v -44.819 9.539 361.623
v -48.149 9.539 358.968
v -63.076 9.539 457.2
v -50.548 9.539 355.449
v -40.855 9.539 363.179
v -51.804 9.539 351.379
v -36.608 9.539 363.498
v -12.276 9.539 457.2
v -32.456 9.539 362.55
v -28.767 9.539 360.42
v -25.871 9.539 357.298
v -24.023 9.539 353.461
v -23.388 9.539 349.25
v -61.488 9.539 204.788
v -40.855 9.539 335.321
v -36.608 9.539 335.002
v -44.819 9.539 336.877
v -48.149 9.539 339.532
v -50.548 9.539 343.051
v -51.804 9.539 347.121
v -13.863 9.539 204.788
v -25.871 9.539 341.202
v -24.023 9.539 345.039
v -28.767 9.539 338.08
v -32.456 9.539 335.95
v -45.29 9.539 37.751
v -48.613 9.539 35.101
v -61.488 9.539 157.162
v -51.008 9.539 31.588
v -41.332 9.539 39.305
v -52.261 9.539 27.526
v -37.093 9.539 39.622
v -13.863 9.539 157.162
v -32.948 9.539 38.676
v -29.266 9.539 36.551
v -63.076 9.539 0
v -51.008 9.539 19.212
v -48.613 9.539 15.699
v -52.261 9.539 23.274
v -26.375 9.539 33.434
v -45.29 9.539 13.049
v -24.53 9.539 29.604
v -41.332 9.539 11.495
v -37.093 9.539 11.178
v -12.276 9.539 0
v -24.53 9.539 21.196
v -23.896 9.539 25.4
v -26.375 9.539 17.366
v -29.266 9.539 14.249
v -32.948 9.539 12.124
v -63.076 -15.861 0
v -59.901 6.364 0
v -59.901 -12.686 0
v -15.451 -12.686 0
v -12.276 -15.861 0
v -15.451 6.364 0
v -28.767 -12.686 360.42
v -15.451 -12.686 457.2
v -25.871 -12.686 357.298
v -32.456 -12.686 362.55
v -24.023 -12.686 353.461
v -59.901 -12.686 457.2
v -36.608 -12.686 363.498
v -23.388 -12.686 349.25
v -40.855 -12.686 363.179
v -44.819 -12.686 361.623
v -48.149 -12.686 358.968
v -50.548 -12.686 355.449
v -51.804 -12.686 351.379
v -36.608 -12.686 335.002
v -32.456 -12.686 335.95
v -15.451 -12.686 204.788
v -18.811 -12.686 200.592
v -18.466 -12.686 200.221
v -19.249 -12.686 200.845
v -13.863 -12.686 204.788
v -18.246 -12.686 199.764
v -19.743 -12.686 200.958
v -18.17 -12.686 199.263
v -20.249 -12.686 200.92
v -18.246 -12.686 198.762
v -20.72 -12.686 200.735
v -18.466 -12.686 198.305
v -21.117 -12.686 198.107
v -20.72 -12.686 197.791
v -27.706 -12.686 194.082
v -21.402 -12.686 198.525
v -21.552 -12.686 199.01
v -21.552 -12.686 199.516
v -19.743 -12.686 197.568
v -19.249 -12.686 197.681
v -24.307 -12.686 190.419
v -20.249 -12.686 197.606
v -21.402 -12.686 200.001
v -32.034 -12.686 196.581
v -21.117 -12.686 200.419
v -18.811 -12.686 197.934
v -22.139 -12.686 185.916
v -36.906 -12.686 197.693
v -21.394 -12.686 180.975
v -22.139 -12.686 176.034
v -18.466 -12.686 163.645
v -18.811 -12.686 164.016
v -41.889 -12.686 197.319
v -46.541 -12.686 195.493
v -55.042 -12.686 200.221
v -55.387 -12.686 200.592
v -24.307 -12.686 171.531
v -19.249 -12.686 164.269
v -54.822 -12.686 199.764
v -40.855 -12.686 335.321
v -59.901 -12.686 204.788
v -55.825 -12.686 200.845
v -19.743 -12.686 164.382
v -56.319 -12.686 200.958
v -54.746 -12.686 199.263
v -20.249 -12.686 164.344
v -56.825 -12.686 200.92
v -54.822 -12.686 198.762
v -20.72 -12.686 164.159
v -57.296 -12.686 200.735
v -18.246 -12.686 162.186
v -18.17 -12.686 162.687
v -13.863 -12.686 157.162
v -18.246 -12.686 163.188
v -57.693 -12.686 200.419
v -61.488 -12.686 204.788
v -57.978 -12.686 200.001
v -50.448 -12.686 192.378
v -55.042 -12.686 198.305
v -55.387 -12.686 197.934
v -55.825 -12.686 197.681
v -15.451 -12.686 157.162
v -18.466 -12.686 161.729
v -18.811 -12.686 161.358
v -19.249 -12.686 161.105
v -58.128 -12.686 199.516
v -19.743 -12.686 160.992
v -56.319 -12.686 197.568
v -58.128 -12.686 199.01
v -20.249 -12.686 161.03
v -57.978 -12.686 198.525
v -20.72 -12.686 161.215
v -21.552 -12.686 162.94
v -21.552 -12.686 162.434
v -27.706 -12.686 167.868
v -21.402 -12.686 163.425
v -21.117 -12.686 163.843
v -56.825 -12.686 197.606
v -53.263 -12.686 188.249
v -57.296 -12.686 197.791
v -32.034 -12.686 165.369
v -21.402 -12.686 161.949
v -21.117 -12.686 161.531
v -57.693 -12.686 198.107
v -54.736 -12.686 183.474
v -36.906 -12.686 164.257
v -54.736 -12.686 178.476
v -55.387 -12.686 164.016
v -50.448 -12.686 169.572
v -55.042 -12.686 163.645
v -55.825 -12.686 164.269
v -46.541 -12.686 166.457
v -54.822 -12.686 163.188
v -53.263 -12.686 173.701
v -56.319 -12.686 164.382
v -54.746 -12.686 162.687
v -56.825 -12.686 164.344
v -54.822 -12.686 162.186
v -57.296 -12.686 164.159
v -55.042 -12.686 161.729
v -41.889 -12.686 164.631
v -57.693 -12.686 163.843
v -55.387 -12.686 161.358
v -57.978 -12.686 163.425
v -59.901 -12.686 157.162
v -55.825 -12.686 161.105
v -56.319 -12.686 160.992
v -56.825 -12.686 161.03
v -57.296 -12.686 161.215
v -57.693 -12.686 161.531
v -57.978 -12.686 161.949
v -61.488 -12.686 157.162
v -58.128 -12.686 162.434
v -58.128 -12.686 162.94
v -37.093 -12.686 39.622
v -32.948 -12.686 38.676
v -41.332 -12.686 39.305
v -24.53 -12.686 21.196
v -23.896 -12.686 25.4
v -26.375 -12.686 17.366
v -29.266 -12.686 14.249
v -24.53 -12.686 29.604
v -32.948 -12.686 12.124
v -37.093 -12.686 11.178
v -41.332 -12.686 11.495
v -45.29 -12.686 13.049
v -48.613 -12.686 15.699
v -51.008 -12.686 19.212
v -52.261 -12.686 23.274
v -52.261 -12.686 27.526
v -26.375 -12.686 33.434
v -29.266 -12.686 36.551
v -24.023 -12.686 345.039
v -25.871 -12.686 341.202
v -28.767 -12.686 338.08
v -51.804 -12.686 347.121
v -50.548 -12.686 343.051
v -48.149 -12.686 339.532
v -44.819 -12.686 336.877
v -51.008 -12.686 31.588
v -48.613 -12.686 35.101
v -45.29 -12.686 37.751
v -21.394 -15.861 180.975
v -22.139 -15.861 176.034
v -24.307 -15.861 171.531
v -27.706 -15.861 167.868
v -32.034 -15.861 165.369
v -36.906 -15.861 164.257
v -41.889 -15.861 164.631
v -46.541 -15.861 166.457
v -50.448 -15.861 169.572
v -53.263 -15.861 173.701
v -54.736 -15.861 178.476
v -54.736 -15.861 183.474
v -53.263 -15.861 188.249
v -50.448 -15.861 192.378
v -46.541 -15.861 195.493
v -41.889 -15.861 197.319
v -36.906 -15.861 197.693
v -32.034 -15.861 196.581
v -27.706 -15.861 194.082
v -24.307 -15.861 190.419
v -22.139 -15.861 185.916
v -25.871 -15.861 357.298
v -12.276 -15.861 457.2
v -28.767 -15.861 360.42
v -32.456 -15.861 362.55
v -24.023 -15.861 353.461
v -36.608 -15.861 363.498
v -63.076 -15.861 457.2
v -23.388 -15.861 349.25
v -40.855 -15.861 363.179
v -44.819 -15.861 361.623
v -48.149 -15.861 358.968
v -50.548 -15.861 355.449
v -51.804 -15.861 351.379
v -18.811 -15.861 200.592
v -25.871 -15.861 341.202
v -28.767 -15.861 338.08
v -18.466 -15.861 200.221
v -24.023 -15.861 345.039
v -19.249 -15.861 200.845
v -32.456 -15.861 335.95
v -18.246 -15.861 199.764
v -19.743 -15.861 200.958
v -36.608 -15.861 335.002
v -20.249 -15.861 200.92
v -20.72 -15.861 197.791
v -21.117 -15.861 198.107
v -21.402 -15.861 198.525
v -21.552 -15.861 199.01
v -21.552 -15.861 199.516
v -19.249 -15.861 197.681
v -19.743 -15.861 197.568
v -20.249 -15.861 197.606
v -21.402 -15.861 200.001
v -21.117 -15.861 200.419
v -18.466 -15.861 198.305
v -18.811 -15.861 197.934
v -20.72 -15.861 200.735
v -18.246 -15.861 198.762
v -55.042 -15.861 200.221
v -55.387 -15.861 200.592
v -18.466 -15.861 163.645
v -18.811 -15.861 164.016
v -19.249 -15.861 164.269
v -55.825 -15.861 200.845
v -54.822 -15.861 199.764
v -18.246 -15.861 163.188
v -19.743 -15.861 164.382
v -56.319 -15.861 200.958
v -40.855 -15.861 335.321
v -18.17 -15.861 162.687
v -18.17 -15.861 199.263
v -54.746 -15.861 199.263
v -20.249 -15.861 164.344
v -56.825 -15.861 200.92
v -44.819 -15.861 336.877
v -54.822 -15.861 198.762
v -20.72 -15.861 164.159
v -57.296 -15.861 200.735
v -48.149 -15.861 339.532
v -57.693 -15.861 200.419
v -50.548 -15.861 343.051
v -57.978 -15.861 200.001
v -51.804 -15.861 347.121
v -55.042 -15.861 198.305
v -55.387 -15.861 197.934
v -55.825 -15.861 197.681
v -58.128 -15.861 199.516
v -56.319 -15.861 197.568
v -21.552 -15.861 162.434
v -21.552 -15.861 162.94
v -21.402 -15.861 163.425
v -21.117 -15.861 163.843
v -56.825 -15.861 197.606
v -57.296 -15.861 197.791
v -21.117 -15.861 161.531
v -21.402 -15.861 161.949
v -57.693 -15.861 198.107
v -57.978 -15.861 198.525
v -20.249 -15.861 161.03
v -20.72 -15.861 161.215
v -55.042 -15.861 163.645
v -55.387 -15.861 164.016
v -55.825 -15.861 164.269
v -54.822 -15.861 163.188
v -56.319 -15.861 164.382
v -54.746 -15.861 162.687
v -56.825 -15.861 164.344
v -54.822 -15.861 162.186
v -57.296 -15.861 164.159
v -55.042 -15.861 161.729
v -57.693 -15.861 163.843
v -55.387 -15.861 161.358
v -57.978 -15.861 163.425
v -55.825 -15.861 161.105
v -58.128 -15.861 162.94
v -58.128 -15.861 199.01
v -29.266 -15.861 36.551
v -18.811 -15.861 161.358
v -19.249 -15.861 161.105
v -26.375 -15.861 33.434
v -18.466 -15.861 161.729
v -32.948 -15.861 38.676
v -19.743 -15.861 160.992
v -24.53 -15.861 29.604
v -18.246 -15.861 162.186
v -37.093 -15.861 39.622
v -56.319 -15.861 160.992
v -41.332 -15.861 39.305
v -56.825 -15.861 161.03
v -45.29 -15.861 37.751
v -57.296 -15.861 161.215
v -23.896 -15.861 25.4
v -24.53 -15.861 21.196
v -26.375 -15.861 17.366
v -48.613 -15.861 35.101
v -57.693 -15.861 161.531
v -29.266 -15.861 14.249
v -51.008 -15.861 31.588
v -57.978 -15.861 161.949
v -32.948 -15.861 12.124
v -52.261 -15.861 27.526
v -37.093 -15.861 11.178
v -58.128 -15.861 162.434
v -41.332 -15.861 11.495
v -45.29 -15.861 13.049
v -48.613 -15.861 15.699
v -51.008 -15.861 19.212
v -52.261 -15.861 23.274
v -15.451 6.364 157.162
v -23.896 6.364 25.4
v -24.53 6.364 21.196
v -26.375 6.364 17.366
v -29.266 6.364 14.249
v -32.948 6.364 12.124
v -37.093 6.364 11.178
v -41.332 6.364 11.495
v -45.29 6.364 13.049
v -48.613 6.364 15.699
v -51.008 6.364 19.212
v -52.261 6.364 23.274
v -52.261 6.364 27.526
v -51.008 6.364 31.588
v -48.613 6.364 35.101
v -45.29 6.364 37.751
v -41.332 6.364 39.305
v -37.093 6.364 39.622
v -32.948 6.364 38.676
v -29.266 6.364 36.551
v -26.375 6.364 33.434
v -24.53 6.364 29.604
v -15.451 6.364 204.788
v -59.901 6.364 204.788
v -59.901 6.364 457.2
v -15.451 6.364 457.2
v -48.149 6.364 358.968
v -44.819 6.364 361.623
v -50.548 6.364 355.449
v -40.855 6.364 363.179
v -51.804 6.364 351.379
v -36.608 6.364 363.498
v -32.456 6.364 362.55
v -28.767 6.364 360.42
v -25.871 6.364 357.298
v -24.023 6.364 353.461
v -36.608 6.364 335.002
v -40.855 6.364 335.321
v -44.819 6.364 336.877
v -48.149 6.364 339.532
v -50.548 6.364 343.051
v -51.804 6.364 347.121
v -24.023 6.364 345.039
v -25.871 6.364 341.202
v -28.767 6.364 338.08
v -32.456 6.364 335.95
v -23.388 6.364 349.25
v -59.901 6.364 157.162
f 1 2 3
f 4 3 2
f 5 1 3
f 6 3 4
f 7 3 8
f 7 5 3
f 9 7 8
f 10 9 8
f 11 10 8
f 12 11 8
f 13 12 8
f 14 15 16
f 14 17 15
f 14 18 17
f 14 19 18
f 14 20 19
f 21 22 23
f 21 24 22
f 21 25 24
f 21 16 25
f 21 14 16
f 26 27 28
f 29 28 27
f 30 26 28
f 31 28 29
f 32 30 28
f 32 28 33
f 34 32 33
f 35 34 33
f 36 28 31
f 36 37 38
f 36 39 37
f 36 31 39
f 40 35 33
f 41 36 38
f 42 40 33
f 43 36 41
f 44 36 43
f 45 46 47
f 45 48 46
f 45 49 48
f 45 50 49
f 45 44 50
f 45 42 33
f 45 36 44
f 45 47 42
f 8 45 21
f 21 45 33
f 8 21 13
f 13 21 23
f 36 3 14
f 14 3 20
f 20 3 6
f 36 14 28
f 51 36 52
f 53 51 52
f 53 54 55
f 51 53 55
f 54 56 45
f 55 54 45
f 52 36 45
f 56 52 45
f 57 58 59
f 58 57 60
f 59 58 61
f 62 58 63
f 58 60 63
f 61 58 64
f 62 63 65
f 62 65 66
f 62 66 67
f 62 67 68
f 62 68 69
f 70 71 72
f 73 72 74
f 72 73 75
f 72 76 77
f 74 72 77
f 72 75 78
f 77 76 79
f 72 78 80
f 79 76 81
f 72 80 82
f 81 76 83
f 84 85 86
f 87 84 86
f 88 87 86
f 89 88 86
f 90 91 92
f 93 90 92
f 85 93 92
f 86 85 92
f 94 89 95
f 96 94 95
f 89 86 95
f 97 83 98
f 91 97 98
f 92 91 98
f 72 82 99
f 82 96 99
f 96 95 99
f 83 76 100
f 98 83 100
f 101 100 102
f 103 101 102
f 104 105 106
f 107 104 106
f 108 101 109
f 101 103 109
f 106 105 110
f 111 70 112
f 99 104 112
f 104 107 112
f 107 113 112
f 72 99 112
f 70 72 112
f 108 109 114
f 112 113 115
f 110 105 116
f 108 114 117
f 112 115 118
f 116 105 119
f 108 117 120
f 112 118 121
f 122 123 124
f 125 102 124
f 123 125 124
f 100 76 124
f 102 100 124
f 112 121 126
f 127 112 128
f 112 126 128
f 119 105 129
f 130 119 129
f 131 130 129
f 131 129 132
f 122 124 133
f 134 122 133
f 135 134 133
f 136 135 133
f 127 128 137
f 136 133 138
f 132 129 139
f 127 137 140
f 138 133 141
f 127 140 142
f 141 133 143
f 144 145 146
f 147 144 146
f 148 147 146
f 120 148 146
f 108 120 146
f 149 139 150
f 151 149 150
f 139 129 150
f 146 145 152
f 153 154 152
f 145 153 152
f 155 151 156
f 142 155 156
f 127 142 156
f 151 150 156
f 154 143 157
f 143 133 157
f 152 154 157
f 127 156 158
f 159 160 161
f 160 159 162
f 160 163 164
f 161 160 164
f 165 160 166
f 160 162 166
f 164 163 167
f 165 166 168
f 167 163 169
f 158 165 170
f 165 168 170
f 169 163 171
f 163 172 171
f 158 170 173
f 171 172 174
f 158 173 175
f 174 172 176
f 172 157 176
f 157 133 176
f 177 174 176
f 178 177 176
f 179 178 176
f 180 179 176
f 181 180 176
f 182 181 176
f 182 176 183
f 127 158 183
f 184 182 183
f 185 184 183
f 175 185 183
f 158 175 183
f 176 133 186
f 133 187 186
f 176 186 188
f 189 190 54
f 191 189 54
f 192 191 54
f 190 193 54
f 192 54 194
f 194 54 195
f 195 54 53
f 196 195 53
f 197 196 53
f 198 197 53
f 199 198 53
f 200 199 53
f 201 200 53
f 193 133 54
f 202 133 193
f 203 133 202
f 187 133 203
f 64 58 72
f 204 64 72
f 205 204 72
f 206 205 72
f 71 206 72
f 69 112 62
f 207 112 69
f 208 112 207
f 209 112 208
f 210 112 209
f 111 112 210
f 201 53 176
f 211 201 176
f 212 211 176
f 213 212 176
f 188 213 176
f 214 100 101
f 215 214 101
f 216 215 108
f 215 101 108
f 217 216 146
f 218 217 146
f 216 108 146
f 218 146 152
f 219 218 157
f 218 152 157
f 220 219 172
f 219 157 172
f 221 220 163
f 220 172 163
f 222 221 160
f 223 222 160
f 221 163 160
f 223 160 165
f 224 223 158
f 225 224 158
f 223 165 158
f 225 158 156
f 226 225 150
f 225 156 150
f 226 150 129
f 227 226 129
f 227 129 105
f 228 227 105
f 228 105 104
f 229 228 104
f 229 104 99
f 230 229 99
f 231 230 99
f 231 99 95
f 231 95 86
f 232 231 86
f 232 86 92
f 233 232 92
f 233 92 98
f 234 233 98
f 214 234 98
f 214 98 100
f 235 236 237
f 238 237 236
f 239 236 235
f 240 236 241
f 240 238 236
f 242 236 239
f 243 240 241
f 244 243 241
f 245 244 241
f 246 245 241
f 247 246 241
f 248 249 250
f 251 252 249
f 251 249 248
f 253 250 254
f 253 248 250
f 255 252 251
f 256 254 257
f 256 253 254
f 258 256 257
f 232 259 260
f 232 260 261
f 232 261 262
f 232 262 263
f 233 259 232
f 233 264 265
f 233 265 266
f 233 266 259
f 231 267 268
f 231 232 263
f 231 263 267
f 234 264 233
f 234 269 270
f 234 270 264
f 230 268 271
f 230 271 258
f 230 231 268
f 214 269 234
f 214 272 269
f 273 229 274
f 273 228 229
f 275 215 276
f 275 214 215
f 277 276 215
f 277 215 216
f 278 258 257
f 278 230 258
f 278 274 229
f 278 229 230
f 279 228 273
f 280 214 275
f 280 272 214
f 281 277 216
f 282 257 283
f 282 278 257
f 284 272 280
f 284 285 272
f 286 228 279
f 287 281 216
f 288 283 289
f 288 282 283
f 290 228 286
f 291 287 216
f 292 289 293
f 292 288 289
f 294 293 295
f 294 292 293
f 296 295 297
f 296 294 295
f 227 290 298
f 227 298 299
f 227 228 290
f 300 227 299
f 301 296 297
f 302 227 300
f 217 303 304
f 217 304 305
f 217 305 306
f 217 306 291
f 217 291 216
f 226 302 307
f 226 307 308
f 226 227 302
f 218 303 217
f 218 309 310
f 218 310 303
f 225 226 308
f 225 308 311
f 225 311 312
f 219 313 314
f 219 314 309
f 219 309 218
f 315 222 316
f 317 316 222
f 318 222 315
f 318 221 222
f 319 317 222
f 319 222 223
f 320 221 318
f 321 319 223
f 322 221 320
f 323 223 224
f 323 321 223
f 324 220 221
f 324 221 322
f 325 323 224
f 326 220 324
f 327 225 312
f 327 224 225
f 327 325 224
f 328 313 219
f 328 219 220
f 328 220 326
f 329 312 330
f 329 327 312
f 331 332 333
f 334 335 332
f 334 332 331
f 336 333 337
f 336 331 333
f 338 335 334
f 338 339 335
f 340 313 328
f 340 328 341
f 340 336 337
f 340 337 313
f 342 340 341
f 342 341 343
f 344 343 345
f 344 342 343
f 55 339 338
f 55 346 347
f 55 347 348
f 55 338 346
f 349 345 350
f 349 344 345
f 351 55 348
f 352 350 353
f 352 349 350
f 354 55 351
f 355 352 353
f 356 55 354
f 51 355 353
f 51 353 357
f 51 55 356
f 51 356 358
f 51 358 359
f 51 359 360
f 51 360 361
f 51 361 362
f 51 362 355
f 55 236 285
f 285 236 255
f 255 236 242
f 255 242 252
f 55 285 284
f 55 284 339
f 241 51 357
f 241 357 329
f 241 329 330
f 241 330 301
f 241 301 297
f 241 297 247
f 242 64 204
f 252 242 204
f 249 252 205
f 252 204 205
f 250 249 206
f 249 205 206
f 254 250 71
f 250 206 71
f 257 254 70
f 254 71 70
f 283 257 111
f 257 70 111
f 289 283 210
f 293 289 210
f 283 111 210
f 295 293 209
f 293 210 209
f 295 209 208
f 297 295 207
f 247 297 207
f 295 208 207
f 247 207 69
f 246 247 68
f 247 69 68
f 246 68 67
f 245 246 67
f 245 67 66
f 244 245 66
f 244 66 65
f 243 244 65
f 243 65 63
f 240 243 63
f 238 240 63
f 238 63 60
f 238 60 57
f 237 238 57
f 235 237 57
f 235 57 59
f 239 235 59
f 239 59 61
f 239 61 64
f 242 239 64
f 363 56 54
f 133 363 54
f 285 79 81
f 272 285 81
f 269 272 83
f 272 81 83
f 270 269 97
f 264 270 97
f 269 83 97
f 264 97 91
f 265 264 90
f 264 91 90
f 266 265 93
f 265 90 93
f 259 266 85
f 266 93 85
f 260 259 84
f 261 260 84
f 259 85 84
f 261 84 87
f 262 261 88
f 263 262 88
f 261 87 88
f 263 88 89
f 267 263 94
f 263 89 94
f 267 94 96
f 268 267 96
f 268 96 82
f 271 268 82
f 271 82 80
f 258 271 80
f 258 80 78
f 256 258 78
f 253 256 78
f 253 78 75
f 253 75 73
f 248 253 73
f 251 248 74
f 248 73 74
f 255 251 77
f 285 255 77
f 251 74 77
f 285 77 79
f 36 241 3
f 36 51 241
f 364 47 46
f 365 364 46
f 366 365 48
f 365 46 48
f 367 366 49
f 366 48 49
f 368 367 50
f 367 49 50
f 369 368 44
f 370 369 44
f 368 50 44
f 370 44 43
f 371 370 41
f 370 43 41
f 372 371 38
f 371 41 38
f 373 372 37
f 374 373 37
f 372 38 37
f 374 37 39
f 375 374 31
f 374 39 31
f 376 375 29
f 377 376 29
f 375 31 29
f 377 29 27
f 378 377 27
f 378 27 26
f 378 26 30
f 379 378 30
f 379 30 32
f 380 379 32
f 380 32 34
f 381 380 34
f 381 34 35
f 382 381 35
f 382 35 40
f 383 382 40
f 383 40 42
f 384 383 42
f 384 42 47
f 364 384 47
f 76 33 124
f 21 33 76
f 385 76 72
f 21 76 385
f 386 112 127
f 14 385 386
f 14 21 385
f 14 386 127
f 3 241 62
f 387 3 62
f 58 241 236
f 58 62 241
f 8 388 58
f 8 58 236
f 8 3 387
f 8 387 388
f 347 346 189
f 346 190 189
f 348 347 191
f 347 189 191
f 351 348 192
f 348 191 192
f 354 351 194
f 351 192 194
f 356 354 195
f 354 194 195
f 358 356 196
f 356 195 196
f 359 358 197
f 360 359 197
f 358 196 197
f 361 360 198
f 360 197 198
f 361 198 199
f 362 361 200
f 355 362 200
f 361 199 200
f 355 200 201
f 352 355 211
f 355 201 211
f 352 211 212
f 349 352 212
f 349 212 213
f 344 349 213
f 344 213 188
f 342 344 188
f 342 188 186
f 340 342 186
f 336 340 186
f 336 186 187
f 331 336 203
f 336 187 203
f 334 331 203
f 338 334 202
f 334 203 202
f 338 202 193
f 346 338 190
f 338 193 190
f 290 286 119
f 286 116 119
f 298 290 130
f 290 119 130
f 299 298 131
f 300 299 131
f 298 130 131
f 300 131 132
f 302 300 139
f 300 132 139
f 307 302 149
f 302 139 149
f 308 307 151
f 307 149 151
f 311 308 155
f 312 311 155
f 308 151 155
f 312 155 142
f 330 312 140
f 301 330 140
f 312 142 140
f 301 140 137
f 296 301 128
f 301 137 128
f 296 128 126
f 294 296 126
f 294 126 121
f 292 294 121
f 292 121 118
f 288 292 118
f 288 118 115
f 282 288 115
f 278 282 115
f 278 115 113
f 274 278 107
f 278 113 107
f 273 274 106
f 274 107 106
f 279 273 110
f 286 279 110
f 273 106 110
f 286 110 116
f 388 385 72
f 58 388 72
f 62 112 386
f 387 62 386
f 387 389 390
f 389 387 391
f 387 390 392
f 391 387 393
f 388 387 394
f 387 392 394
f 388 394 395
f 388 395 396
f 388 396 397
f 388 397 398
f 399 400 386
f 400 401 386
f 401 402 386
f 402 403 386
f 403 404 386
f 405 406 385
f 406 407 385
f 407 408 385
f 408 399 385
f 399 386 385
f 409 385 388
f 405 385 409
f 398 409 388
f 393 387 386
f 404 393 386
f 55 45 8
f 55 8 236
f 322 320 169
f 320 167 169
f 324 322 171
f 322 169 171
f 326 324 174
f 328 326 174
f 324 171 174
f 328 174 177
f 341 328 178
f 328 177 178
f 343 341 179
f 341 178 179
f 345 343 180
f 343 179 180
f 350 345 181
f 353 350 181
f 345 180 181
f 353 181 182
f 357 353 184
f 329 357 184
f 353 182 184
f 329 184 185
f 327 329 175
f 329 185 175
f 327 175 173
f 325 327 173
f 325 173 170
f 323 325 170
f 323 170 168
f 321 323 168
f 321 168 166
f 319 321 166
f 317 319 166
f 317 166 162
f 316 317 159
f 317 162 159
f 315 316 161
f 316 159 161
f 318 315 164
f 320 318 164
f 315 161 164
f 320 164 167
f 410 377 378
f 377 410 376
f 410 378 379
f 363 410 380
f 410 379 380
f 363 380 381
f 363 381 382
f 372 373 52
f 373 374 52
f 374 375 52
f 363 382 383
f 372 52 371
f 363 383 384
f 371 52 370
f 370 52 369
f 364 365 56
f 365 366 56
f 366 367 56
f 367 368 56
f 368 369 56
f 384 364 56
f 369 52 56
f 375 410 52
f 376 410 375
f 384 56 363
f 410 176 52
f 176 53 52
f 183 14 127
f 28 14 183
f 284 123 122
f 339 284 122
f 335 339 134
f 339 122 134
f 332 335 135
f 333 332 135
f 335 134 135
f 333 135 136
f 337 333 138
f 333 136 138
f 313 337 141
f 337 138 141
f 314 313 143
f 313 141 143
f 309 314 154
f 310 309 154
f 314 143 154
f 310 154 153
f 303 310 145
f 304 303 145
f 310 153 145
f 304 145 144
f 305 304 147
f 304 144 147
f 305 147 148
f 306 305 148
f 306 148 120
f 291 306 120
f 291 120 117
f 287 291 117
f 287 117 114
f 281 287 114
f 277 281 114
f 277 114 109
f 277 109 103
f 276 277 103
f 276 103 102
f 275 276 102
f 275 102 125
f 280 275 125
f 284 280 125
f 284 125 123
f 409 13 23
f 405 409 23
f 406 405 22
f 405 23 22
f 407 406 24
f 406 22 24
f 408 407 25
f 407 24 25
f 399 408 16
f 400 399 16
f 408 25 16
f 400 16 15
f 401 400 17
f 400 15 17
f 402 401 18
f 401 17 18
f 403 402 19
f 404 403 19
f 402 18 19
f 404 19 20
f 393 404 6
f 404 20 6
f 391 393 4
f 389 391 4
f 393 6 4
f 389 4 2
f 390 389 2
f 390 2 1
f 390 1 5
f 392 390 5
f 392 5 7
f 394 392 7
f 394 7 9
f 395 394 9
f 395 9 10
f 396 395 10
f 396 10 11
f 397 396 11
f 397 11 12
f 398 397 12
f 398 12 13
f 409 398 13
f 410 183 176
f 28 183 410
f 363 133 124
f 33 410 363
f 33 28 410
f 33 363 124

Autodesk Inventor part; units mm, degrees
ref_plane "YZ Plane" through (0, 0, 0) normal (1, 0, 0) x (0, 1, 0)
ref_plane "XZ Plane" through (0, 0, 0) normal (0, 1, 0) x (-1, 0, 0)
ref_plane "XY Plane" through (0, 0, 0) normal (0, 0, 1) x (1, 0, 0)
sketch "Sketch1" plane through (0, 0, 0) normal (0, 0, 1) x (1, 0, 0)
  line L0 (-59.9006, 6.3636) -> (-15.4506, 6.3636)
  line L1 (-15.4506, 6.3636) -> (-15.4506, -12.6864)
  line L2 (-15.4506, -12.6864) -> (-59.9006, -12.6864)
  line L3 (-59.9006, -12.6864) -> (-59.9006, 6.3636)
  line L4 (-63.0756, 9.5386) -> (-12.2756, 9.5386)
  line L5 (-12.2756, 9.5386) -> (-12.2756, -15.8614)
  line L6 (-12.2756, -15.8614) -> (-63.0756, -15.8614)
  line L7 (-63.0756, -15.8614) -> (-63.0756, 9.5386)
  point P0 (0, 0)
  dimension "d2" = 3.175
  dimension "d5" = 50.8
  dimension "d6" = 25.4
extrude "Extrusion1" add sketch "Sketch1" along normal blind 457.2
sketch "Sketch4" plane through (-63.0756, 9.5386, 0) normal (0, 1, 0) x (1, 0, 0)
  circle A0 centre (24.9171, -25.4) radius 14.2621
  line L0 (0, 0) -> (50.8, 0) projected
  point P0 (63.0756, 0)
  dimension "d13" = 28.5242
  dimension "d14" = 25.4
extrude "Extrusion4" cut sketch "Sketch4" against normal through all
sketch "Sketch2" plane through (-63.0756, 9.5386, 0) normal (0, 1, 0) x (1, 0, 0)
  line L0 (1.5875, -157.1625) -> (49.2125, -157.1625)
  line L1 (49.2125, -157.1625) -> (49.2125, -204.7875)
  line L2 (49.2125, -204.7875) -> (1.5875, -204.7875)
  line L3 (1.5875, -204.7875) -> (1.5875, -157.1625)
  line L4 (50.8, -457.2) -> (0, -457.2) projected
  circle A0 centre (24.9171, -25.4) radius 14.2621 projected
  line L5 (0, 0) -> (50.8, 0) projected
  point P0 (63.0756, 0)
  point P1 (25.4, -204.7875)
  point P2 (25.4, -457.2)
  dimension "d7" = 47.625
  dimension "d8" = 47.625
  dimension "d24" = 157.1625
extrude "Extrusion2" cut sketch "Sketch2" against normal up to surface (22.225 mm away) contours L0 L1 L2 L3
sketch "Sketch9" plane through (-59.9006, -12.6864, 0) normal (0, 1, 0) x (1, 0, 0)
  circle A0 centre (21.7421, -180.975) radius 16.7645
  line L0 (-1.5875, -204.7875) -> (-1.5875, -157.1625) projected
  circle A1 centre (21.7421, -25.4) radius 14.2621 projected
  circle A2 centre (3.4541, -199.263) radius 1.7
  circle A3 centre (40.0301, -199.263) radius 1.7
  circle A4 centre (40.0301, -162.687) radius 1.7
  circle A5 centre (3.4541, -162.687) radius 1.7
  point P0 (59.9006, 0)
  point P1 (-1.5875, -180.975)
  dimension "d34" = 18.288
  dimension "d35" = 18.288
  dimension "d38" = 360
extrude "Extrusion8" cut sketch "Sketch9" against normal through all contours A0 | A2 | A3 | A4 | A5
sketch "Sketch10" plane through (-63.0756, 9.5386, 0) normal (0, 1, 0) x (1, 0, 0)
  circle A0 centre (25.4, -349.25) radius 14.2875
  line L0 (50.8, -457.2) -> (0, -457.2) projected
  line L1 (0, 0) -> (50.8, 0) projected
  point P0 (63.0756, 0)
  point P1 (25.4, -457.2)
  dimension "d42" = 28.575
  dimension "d43" = 349.25
extrude "Extrusion9" cut sketch "Sketch10" against normal through all
equation "\"d8\" = d7"
equation "\"d35\" = d34"
properties part number "1x2 arm"
